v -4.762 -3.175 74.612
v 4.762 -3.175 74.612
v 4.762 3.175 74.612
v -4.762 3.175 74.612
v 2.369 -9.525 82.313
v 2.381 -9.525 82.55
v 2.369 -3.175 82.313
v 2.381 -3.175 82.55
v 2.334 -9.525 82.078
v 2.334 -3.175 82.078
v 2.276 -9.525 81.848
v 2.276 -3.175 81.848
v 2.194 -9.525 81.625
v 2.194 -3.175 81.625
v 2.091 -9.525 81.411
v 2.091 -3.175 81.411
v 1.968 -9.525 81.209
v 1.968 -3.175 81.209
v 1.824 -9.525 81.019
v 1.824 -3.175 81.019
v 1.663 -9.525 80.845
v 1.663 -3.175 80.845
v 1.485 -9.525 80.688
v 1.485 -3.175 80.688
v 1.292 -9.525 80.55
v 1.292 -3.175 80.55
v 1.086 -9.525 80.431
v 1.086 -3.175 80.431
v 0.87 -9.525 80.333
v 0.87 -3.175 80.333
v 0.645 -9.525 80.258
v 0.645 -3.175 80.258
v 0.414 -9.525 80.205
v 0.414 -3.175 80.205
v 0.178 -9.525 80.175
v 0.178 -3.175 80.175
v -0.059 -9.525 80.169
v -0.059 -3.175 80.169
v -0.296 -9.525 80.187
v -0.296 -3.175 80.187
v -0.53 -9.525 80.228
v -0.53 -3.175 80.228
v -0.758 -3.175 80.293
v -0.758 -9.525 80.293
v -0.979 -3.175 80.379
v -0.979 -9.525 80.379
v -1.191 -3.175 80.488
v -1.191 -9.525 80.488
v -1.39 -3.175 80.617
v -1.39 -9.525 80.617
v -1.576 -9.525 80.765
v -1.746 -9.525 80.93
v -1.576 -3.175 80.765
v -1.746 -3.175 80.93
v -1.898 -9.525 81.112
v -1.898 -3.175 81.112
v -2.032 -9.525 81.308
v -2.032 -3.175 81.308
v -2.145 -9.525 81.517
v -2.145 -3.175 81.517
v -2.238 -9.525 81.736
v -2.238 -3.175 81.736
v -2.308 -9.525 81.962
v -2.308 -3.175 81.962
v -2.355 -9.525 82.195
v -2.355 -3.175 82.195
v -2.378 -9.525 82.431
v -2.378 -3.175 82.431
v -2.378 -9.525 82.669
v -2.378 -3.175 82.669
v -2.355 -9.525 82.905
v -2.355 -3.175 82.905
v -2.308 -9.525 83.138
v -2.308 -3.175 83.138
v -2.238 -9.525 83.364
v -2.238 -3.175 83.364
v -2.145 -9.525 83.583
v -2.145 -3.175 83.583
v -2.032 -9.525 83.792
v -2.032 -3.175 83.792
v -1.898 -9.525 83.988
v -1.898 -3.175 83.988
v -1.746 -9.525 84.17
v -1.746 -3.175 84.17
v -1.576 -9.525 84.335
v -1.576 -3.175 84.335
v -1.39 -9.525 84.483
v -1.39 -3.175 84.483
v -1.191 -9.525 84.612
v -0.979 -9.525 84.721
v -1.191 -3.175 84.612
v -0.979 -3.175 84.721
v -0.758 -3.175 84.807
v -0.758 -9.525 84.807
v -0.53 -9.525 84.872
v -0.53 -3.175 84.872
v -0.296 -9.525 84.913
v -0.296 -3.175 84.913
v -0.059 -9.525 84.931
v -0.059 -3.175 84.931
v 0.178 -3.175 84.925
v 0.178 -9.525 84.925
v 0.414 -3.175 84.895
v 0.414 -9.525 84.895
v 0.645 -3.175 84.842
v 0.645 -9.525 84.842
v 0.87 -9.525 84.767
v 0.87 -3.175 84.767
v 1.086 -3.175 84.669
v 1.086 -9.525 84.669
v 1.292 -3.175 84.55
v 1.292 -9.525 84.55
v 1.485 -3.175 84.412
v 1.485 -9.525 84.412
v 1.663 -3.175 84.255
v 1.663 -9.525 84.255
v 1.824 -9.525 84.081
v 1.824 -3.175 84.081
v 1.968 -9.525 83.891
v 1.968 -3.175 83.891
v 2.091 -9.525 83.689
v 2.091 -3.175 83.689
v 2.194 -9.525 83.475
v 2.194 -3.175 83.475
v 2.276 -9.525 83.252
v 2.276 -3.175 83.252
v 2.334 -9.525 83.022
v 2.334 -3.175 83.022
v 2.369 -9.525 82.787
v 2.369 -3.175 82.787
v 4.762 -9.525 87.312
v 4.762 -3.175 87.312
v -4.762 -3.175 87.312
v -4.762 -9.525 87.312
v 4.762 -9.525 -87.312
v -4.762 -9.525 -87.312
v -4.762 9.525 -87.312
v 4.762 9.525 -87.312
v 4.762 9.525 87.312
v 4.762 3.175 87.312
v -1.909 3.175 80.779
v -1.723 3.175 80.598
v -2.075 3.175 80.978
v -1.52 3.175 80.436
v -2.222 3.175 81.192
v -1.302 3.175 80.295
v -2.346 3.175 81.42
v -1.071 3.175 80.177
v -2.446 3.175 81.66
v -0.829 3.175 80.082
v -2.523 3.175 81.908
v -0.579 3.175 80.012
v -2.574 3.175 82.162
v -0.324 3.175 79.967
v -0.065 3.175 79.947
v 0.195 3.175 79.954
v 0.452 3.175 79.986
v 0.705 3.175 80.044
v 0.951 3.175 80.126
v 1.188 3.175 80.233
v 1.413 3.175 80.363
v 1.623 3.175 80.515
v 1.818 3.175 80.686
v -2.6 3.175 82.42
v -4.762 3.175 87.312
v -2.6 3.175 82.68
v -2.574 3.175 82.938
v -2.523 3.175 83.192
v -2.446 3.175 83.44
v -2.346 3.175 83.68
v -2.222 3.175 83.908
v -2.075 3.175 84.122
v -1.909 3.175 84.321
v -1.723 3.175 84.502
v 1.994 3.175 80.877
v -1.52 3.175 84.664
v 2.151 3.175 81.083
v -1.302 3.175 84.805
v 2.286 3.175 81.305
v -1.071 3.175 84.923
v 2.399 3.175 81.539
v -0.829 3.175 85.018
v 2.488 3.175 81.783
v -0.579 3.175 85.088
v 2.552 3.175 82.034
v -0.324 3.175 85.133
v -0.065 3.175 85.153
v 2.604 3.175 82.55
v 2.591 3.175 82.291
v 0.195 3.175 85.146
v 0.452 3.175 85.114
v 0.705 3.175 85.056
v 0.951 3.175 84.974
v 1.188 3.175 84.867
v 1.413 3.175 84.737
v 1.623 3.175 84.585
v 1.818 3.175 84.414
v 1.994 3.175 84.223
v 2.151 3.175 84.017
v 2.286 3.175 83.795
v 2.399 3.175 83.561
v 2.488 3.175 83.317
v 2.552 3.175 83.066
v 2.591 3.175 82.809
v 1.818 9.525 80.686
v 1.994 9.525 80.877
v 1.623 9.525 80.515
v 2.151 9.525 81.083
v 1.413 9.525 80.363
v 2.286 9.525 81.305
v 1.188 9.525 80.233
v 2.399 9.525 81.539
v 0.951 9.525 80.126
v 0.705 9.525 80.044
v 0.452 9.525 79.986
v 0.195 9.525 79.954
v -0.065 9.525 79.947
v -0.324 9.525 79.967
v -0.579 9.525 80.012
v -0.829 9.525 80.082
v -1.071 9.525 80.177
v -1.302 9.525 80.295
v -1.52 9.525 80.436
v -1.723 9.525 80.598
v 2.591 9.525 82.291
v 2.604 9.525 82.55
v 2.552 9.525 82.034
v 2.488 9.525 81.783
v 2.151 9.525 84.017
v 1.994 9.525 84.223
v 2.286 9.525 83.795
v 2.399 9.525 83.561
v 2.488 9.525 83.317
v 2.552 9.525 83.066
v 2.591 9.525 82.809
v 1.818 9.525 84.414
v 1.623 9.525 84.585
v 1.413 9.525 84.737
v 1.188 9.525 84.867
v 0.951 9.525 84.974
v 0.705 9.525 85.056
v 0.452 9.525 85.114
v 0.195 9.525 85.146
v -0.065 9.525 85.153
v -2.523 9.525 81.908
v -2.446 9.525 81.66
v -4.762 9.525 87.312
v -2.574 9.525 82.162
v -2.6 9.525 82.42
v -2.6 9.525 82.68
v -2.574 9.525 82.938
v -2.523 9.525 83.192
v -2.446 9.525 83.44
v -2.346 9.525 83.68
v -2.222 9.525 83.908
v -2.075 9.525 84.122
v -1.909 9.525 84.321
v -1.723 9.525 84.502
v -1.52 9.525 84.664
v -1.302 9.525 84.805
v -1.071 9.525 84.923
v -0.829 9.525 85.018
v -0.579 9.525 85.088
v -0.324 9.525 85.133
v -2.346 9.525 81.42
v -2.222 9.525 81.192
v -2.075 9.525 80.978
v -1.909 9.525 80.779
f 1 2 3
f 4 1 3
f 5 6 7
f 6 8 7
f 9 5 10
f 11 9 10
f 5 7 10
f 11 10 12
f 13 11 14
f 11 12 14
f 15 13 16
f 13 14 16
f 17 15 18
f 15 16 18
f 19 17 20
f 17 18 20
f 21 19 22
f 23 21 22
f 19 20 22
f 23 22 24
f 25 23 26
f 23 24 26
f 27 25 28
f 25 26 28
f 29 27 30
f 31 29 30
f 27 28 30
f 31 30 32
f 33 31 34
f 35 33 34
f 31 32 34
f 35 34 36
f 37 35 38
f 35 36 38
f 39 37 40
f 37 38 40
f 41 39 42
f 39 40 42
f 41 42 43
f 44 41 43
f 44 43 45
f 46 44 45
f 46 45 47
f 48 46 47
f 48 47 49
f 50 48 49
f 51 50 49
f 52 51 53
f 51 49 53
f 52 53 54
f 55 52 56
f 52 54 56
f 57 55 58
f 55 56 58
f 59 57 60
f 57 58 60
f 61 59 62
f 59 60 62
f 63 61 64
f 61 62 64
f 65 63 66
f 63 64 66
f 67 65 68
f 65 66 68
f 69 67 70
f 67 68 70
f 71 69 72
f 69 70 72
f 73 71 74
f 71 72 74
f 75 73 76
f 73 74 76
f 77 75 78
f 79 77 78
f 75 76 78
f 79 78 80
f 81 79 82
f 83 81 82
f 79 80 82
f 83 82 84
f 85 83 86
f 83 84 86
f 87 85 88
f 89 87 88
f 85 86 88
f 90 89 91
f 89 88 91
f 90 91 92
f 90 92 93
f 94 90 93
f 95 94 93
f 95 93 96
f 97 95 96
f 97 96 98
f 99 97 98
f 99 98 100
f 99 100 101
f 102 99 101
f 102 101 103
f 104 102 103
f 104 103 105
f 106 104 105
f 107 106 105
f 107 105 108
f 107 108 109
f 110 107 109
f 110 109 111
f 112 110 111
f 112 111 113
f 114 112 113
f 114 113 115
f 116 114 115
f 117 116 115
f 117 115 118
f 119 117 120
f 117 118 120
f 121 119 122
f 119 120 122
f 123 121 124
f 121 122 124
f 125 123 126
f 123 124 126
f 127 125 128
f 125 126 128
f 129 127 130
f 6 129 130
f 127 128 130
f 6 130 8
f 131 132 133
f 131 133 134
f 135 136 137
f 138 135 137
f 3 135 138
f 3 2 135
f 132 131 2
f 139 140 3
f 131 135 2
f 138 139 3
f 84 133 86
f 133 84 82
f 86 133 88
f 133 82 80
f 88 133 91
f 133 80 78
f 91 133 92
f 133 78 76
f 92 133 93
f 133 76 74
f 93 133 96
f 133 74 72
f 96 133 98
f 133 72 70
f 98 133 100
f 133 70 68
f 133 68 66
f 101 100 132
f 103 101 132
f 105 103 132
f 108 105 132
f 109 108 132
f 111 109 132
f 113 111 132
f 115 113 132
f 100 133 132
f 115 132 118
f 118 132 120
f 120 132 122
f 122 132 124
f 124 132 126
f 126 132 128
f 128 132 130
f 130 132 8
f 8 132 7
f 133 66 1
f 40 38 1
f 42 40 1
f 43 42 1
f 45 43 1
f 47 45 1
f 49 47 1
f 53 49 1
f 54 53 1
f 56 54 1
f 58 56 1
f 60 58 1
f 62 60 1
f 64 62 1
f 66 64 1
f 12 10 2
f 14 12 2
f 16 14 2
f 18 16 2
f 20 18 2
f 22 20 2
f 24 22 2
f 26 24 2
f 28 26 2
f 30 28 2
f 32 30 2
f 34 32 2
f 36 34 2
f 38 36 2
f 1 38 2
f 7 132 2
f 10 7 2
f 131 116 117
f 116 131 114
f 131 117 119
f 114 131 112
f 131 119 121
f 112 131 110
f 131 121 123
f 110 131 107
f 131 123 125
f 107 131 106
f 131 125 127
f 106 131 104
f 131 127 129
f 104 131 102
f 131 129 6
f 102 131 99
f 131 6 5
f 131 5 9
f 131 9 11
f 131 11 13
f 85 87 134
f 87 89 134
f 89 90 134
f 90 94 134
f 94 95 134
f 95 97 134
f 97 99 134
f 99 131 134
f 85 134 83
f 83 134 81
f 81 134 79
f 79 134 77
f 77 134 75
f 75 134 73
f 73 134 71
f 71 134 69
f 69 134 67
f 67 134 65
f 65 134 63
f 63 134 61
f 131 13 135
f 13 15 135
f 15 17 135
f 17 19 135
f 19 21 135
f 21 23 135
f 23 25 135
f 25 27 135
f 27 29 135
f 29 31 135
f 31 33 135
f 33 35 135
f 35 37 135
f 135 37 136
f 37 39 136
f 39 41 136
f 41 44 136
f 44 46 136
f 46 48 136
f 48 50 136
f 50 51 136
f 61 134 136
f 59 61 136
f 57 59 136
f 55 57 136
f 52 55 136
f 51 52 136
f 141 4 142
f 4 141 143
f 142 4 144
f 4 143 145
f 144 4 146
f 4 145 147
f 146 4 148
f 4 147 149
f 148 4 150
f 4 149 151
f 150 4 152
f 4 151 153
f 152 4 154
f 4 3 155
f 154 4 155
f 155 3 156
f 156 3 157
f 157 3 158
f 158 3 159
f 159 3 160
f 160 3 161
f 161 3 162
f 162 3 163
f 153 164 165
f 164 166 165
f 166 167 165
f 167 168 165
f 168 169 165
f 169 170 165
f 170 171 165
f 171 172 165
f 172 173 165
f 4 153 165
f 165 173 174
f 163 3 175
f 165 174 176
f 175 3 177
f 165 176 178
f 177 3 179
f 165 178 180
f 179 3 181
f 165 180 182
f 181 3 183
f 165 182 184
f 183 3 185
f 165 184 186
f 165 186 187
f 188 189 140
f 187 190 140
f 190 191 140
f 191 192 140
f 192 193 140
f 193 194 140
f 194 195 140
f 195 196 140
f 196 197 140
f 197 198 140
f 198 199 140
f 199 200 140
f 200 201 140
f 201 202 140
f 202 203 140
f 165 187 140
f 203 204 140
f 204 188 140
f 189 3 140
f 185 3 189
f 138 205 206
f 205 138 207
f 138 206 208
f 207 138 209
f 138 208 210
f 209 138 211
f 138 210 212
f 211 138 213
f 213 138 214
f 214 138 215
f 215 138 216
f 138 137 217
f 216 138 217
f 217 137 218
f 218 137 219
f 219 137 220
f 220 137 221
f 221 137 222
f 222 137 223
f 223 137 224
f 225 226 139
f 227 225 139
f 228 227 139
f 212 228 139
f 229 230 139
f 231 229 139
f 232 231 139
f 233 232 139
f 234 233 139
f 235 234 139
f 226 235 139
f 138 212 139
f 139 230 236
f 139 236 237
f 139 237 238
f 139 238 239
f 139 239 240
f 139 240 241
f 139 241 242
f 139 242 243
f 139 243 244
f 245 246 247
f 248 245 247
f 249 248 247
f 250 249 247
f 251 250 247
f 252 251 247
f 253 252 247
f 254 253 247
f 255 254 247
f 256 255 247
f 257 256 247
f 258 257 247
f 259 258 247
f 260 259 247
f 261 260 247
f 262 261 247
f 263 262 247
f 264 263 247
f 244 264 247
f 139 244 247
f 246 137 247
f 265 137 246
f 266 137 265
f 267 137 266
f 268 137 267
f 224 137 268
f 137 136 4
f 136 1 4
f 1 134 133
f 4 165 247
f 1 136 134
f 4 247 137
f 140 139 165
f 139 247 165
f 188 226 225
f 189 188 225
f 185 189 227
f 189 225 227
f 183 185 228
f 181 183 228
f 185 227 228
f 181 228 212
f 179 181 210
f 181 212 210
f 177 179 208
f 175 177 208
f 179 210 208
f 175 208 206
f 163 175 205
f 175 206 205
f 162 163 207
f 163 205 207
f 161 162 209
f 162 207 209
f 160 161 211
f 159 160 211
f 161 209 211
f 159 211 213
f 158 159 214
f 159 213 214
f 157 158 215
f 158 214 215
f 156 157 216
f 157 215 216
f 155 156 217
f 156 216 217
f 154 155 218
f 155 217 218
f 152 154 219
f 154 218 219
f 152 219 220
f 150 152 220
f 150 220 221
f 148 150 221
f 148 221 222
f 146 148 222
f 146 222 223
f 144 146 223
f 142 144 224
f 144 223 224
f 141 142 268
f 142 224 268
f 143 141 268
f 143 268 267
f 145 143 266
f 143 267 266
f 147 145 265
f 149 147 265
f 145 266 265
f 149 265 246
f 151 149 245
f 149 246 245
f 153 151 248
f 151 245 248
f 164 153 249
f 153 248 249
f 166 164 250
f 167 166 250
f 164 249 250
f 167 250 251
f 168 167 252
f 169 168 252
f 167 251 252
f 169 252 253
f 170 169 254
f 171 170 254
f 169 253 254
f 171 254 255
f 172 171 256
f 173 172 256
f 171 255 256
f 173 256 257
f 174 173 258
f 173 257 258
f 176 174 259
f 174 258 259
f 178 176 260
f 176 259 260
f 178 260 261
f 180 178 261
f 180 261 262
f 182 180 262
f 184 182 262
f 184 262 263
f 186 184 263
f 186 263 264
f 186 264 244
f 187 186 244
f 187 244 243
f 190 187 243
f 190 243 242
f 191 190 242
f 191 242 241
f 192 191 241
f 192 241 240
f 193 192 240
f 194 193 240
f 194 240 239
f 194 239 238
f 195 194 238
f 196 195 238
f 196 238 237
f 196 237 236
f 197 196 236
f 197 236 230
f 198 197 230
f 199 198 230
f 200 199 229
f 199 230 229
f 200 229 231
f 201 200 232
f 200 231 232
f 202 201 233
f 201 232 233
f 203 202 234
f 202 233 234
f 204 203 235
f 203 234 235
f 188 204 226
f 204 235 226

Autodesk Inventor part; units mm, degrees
ref_plane "YZ Plane" through (0, 0, 0) normal (1, 0, 0) x (0, 1, 0)
ref_plane "XZ Plane" through (0, 0, 0) normal (0, 1, 0) x (-1, 0, 0)
ref_plane "XY Plane" through (0, 0, 0) normal (0, 0, 1) x (1, 0, 0)
sketch "Sketch1" plane through (0, 0, 0) normal (1, 0, 0) x (0, 1, 0)
  line L0 (-9.525, -87.3125) -> (9.525, -87.3125)
  line L1 (9.525, -87.3125) -> (9.525, 87.3125)
  line L2 (9.525, 87.3125) -> (-9.525, 87.3125)
  line L3 (-9.525, 87.3125) -> (-9.525, -87.3125)
  line L4 (-9.525, -87.3125) -> (9.525, 87.3125) construction
  line L5 (9.525, -87.3125) -> (-9.525, 87.3125) construction
  point P0 (0, 0)
  dimension "d0" = 19.05
  dimension "d1" = 174.625
extrude "Extrusion1" add sketch "Sketch1" along normal mid plane 9.525
sketch "Sketch2" plane through (4.7625, 0, 0) normal (1, 0, 0) x (0, 0, -1)
  line L0 (-100.0125, -3.175) -> (-74.6125, -3.175)
  line L1 (-74.6125, -3.175) -> (-74.6125, 3.175)
  line L2 (-74.6125, 3.175) -> (-100.0125, 3.175)
  line L3 (-100.0125, 3.175) -> (-100.0125, -3.175)
  line L4 (-87.3125, 9.525) -> (-87.3125, -9.525) projected
  line L5 (-100.0125, -3.175) -> (-74.6125, 3.175) construction
  line L6 (-74.6125, -3.175) -> (-100.0125, 3.175) construction
  point P0 (0, 0)
  point P1 (-87.3125, 0)
  point P2 (-87.3125, 3.175)
  point P3 (-87.3125, -3.175)
  dimension "d4" = 6.35
  dimension "d5" = 12.7
extrude "Extrusion2" cut sketch "Sketch2" against normal blind 25.4 contours L4 L2 L1 L0
sketch "Sketch3" plane through (-4.7625, 9.525, 87.3125) normal (0, 1, 0) x (1, 0, 0)
  line L0 (0, 0) -> (9.525, 0) projected
  circle A0 centre (4.7625, 4.7625) radius 2.6035
  point P0 (4.7625, 87.3125)
  point P1 (4.7625, 0)
  dimension "d8" = 5.207
  dimension "d9" = 4.7625
extrude "Extrusion3" cut sketch "Sketch3" against normal blind 6.35
sketch "Sketch4" plane through (4.7625, -3.175, 87.3125) normal (0, 1, 0) x (1, 0, 0)
  line L0 (-9.525, 0) -> (-9.525, 12.7) projected
  line L1 (0, 0) -> (-9.525, 0) projected
  line L2 (0, 12.7) -> (0, 0) projected
  line L3 (0, 12.7) -> (-9.525, 12.7) projected
  circle A0 centre (-4.7625, 4.7625) radius 2.6035 projected
  circle A1 centre (-4.7625, 4.7625) radius 2.3813
  point P0 (-4.7625, 87.3125)
  dimension "d12" = 4.7625
extrude "Extrusion4" cut sketch "Sketch4" against normal blind 25.4 contours A1
properties part number "LongBraillePlunger"
